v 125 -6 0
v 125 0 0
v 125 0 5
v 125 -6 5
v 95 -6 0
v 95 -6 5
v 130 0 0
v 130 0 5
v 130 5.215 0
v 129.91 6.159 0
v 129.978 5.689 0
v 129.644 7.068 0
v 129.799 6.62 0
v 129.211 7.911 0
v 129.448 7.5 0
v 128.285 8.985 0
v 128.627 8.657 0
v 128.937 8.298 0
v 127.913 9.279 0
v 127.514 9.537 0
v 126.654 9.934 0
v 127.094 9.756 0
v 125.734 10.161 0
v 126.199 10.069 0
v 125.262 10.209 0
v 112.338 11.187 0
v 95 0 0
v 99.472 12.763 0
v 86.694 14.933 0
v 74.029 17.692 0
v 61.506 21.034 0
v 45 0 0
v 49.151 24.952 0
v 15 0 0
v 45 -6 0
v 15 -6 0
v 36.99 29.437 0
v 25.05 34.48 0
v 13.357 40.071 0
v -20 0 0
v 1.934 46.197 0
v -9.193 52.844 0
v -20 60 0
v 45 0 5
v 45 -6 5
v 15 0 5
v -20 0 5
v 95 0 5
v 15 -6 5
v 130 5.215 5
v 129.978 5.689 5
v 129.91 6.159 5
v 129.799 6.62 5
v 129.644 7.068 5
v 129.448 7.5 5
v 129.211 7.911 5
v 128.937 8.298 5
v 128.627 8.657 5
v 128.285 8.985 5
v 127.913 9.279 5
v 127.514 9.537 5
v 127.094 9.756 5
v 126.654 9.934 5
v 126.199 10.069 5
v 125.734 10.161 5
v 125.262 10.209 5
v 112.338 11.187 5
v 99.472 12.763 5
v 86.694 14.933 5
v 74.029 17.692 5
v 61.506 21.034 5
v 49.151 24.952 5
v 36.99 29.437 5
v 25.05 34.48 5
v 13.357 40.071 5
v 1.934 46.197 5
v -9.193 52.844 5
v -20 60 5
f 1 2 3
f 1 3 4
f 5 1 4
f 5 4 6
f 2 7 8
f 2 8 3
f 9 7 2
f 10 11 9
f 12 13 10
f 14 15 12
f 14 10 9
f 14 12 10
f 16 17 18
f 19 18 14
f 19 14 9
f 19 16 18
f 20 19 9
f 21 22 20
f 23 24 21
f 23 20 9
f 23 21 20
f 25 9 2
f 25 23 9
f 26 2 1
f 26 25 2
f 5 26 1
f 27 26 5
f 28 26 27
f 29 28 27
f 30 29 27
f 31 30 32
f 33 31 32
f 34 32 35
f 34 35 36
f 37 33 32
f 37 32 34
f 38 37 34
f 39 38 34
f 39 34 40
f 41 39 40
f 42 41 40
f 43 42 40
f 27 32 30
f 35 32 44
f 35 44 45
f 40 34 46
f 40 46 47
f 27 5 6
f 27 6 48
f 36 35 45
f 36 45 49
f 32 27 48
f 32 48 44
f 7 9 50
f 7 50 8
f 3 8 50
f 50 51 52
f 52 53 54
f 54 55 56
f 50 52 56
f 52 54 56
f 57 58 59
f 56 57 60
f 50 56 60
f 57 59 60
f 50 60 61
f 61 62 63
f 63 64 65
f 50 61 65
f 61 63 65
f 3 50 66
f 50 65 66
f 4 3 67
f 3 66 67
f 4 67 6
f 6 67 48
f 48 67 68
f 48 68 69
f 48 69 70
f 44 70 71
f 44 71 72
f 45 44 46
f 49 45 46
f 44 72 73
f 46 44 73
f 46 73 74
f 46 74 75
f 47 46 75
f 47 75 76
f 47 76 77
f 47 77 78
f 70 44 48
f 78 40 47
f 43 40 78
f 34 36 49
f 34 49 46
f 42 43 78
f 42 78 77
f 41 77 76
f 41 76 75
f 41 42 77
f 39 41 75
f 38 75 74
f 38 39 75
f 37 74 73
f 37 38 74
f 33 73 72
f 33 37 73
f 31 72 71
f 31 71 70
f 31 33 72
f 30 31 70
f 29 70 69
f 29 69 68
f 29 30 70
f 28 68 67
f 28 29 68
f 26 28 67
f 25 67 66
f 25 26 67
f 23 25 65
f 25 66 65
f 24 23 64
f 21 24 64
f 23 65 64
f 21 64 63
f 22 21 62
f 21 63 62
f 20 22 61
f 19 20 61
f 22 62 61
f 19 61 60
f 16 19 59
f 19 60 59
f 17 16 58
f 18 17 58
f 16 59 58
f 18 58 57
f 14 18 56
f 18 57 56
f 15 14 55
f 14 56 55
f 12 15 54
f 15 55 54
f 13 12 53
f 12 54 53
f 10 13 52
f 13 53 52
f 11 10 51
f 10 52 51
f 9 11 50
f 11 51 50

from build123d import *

# Parameters (mm, degrees)
EXTRUDE_1_DEPTH = 5
FILLET_1_R      = 5


with BuildPart() as part:
    # 草图1 → 凸台-拉伸1 (new body)
    with BuildSketch(Plane.XY):
        with BuildLine():
            Line((125, 0), (125, -6))
            Line((125, -6), (95, -6))
            Line((95, -6), (95, 0))
            Line((95, 0), (45, 0))
            Line((45, 0), (45, -6))
            Line((45, -6), (15, -6))
            Line((15, -6), (15, 0))
            Line((15, 0), (0, 0))
            Line((0, 0), (-20, 0))
            Line((-20, 0), (-20, 60))
            ThreePointArc((-20, 60), (51.397381618, 24.192144853), (130, 10))
            Line((130, 10), (130, 0))
            Line((130, 0), (125, 0))
        make_face()
    extrude(amount=EXTRUDE_1_DEPTH)

    # 圆角1
    fillet_1_edges = [part.edges().sort_by_distance(p)[0] for p in [
        (130, 10, 2.5),
    ]]
    fillet(fillet_1_edges, radius=FILLET_1_R)


solid = part.part
